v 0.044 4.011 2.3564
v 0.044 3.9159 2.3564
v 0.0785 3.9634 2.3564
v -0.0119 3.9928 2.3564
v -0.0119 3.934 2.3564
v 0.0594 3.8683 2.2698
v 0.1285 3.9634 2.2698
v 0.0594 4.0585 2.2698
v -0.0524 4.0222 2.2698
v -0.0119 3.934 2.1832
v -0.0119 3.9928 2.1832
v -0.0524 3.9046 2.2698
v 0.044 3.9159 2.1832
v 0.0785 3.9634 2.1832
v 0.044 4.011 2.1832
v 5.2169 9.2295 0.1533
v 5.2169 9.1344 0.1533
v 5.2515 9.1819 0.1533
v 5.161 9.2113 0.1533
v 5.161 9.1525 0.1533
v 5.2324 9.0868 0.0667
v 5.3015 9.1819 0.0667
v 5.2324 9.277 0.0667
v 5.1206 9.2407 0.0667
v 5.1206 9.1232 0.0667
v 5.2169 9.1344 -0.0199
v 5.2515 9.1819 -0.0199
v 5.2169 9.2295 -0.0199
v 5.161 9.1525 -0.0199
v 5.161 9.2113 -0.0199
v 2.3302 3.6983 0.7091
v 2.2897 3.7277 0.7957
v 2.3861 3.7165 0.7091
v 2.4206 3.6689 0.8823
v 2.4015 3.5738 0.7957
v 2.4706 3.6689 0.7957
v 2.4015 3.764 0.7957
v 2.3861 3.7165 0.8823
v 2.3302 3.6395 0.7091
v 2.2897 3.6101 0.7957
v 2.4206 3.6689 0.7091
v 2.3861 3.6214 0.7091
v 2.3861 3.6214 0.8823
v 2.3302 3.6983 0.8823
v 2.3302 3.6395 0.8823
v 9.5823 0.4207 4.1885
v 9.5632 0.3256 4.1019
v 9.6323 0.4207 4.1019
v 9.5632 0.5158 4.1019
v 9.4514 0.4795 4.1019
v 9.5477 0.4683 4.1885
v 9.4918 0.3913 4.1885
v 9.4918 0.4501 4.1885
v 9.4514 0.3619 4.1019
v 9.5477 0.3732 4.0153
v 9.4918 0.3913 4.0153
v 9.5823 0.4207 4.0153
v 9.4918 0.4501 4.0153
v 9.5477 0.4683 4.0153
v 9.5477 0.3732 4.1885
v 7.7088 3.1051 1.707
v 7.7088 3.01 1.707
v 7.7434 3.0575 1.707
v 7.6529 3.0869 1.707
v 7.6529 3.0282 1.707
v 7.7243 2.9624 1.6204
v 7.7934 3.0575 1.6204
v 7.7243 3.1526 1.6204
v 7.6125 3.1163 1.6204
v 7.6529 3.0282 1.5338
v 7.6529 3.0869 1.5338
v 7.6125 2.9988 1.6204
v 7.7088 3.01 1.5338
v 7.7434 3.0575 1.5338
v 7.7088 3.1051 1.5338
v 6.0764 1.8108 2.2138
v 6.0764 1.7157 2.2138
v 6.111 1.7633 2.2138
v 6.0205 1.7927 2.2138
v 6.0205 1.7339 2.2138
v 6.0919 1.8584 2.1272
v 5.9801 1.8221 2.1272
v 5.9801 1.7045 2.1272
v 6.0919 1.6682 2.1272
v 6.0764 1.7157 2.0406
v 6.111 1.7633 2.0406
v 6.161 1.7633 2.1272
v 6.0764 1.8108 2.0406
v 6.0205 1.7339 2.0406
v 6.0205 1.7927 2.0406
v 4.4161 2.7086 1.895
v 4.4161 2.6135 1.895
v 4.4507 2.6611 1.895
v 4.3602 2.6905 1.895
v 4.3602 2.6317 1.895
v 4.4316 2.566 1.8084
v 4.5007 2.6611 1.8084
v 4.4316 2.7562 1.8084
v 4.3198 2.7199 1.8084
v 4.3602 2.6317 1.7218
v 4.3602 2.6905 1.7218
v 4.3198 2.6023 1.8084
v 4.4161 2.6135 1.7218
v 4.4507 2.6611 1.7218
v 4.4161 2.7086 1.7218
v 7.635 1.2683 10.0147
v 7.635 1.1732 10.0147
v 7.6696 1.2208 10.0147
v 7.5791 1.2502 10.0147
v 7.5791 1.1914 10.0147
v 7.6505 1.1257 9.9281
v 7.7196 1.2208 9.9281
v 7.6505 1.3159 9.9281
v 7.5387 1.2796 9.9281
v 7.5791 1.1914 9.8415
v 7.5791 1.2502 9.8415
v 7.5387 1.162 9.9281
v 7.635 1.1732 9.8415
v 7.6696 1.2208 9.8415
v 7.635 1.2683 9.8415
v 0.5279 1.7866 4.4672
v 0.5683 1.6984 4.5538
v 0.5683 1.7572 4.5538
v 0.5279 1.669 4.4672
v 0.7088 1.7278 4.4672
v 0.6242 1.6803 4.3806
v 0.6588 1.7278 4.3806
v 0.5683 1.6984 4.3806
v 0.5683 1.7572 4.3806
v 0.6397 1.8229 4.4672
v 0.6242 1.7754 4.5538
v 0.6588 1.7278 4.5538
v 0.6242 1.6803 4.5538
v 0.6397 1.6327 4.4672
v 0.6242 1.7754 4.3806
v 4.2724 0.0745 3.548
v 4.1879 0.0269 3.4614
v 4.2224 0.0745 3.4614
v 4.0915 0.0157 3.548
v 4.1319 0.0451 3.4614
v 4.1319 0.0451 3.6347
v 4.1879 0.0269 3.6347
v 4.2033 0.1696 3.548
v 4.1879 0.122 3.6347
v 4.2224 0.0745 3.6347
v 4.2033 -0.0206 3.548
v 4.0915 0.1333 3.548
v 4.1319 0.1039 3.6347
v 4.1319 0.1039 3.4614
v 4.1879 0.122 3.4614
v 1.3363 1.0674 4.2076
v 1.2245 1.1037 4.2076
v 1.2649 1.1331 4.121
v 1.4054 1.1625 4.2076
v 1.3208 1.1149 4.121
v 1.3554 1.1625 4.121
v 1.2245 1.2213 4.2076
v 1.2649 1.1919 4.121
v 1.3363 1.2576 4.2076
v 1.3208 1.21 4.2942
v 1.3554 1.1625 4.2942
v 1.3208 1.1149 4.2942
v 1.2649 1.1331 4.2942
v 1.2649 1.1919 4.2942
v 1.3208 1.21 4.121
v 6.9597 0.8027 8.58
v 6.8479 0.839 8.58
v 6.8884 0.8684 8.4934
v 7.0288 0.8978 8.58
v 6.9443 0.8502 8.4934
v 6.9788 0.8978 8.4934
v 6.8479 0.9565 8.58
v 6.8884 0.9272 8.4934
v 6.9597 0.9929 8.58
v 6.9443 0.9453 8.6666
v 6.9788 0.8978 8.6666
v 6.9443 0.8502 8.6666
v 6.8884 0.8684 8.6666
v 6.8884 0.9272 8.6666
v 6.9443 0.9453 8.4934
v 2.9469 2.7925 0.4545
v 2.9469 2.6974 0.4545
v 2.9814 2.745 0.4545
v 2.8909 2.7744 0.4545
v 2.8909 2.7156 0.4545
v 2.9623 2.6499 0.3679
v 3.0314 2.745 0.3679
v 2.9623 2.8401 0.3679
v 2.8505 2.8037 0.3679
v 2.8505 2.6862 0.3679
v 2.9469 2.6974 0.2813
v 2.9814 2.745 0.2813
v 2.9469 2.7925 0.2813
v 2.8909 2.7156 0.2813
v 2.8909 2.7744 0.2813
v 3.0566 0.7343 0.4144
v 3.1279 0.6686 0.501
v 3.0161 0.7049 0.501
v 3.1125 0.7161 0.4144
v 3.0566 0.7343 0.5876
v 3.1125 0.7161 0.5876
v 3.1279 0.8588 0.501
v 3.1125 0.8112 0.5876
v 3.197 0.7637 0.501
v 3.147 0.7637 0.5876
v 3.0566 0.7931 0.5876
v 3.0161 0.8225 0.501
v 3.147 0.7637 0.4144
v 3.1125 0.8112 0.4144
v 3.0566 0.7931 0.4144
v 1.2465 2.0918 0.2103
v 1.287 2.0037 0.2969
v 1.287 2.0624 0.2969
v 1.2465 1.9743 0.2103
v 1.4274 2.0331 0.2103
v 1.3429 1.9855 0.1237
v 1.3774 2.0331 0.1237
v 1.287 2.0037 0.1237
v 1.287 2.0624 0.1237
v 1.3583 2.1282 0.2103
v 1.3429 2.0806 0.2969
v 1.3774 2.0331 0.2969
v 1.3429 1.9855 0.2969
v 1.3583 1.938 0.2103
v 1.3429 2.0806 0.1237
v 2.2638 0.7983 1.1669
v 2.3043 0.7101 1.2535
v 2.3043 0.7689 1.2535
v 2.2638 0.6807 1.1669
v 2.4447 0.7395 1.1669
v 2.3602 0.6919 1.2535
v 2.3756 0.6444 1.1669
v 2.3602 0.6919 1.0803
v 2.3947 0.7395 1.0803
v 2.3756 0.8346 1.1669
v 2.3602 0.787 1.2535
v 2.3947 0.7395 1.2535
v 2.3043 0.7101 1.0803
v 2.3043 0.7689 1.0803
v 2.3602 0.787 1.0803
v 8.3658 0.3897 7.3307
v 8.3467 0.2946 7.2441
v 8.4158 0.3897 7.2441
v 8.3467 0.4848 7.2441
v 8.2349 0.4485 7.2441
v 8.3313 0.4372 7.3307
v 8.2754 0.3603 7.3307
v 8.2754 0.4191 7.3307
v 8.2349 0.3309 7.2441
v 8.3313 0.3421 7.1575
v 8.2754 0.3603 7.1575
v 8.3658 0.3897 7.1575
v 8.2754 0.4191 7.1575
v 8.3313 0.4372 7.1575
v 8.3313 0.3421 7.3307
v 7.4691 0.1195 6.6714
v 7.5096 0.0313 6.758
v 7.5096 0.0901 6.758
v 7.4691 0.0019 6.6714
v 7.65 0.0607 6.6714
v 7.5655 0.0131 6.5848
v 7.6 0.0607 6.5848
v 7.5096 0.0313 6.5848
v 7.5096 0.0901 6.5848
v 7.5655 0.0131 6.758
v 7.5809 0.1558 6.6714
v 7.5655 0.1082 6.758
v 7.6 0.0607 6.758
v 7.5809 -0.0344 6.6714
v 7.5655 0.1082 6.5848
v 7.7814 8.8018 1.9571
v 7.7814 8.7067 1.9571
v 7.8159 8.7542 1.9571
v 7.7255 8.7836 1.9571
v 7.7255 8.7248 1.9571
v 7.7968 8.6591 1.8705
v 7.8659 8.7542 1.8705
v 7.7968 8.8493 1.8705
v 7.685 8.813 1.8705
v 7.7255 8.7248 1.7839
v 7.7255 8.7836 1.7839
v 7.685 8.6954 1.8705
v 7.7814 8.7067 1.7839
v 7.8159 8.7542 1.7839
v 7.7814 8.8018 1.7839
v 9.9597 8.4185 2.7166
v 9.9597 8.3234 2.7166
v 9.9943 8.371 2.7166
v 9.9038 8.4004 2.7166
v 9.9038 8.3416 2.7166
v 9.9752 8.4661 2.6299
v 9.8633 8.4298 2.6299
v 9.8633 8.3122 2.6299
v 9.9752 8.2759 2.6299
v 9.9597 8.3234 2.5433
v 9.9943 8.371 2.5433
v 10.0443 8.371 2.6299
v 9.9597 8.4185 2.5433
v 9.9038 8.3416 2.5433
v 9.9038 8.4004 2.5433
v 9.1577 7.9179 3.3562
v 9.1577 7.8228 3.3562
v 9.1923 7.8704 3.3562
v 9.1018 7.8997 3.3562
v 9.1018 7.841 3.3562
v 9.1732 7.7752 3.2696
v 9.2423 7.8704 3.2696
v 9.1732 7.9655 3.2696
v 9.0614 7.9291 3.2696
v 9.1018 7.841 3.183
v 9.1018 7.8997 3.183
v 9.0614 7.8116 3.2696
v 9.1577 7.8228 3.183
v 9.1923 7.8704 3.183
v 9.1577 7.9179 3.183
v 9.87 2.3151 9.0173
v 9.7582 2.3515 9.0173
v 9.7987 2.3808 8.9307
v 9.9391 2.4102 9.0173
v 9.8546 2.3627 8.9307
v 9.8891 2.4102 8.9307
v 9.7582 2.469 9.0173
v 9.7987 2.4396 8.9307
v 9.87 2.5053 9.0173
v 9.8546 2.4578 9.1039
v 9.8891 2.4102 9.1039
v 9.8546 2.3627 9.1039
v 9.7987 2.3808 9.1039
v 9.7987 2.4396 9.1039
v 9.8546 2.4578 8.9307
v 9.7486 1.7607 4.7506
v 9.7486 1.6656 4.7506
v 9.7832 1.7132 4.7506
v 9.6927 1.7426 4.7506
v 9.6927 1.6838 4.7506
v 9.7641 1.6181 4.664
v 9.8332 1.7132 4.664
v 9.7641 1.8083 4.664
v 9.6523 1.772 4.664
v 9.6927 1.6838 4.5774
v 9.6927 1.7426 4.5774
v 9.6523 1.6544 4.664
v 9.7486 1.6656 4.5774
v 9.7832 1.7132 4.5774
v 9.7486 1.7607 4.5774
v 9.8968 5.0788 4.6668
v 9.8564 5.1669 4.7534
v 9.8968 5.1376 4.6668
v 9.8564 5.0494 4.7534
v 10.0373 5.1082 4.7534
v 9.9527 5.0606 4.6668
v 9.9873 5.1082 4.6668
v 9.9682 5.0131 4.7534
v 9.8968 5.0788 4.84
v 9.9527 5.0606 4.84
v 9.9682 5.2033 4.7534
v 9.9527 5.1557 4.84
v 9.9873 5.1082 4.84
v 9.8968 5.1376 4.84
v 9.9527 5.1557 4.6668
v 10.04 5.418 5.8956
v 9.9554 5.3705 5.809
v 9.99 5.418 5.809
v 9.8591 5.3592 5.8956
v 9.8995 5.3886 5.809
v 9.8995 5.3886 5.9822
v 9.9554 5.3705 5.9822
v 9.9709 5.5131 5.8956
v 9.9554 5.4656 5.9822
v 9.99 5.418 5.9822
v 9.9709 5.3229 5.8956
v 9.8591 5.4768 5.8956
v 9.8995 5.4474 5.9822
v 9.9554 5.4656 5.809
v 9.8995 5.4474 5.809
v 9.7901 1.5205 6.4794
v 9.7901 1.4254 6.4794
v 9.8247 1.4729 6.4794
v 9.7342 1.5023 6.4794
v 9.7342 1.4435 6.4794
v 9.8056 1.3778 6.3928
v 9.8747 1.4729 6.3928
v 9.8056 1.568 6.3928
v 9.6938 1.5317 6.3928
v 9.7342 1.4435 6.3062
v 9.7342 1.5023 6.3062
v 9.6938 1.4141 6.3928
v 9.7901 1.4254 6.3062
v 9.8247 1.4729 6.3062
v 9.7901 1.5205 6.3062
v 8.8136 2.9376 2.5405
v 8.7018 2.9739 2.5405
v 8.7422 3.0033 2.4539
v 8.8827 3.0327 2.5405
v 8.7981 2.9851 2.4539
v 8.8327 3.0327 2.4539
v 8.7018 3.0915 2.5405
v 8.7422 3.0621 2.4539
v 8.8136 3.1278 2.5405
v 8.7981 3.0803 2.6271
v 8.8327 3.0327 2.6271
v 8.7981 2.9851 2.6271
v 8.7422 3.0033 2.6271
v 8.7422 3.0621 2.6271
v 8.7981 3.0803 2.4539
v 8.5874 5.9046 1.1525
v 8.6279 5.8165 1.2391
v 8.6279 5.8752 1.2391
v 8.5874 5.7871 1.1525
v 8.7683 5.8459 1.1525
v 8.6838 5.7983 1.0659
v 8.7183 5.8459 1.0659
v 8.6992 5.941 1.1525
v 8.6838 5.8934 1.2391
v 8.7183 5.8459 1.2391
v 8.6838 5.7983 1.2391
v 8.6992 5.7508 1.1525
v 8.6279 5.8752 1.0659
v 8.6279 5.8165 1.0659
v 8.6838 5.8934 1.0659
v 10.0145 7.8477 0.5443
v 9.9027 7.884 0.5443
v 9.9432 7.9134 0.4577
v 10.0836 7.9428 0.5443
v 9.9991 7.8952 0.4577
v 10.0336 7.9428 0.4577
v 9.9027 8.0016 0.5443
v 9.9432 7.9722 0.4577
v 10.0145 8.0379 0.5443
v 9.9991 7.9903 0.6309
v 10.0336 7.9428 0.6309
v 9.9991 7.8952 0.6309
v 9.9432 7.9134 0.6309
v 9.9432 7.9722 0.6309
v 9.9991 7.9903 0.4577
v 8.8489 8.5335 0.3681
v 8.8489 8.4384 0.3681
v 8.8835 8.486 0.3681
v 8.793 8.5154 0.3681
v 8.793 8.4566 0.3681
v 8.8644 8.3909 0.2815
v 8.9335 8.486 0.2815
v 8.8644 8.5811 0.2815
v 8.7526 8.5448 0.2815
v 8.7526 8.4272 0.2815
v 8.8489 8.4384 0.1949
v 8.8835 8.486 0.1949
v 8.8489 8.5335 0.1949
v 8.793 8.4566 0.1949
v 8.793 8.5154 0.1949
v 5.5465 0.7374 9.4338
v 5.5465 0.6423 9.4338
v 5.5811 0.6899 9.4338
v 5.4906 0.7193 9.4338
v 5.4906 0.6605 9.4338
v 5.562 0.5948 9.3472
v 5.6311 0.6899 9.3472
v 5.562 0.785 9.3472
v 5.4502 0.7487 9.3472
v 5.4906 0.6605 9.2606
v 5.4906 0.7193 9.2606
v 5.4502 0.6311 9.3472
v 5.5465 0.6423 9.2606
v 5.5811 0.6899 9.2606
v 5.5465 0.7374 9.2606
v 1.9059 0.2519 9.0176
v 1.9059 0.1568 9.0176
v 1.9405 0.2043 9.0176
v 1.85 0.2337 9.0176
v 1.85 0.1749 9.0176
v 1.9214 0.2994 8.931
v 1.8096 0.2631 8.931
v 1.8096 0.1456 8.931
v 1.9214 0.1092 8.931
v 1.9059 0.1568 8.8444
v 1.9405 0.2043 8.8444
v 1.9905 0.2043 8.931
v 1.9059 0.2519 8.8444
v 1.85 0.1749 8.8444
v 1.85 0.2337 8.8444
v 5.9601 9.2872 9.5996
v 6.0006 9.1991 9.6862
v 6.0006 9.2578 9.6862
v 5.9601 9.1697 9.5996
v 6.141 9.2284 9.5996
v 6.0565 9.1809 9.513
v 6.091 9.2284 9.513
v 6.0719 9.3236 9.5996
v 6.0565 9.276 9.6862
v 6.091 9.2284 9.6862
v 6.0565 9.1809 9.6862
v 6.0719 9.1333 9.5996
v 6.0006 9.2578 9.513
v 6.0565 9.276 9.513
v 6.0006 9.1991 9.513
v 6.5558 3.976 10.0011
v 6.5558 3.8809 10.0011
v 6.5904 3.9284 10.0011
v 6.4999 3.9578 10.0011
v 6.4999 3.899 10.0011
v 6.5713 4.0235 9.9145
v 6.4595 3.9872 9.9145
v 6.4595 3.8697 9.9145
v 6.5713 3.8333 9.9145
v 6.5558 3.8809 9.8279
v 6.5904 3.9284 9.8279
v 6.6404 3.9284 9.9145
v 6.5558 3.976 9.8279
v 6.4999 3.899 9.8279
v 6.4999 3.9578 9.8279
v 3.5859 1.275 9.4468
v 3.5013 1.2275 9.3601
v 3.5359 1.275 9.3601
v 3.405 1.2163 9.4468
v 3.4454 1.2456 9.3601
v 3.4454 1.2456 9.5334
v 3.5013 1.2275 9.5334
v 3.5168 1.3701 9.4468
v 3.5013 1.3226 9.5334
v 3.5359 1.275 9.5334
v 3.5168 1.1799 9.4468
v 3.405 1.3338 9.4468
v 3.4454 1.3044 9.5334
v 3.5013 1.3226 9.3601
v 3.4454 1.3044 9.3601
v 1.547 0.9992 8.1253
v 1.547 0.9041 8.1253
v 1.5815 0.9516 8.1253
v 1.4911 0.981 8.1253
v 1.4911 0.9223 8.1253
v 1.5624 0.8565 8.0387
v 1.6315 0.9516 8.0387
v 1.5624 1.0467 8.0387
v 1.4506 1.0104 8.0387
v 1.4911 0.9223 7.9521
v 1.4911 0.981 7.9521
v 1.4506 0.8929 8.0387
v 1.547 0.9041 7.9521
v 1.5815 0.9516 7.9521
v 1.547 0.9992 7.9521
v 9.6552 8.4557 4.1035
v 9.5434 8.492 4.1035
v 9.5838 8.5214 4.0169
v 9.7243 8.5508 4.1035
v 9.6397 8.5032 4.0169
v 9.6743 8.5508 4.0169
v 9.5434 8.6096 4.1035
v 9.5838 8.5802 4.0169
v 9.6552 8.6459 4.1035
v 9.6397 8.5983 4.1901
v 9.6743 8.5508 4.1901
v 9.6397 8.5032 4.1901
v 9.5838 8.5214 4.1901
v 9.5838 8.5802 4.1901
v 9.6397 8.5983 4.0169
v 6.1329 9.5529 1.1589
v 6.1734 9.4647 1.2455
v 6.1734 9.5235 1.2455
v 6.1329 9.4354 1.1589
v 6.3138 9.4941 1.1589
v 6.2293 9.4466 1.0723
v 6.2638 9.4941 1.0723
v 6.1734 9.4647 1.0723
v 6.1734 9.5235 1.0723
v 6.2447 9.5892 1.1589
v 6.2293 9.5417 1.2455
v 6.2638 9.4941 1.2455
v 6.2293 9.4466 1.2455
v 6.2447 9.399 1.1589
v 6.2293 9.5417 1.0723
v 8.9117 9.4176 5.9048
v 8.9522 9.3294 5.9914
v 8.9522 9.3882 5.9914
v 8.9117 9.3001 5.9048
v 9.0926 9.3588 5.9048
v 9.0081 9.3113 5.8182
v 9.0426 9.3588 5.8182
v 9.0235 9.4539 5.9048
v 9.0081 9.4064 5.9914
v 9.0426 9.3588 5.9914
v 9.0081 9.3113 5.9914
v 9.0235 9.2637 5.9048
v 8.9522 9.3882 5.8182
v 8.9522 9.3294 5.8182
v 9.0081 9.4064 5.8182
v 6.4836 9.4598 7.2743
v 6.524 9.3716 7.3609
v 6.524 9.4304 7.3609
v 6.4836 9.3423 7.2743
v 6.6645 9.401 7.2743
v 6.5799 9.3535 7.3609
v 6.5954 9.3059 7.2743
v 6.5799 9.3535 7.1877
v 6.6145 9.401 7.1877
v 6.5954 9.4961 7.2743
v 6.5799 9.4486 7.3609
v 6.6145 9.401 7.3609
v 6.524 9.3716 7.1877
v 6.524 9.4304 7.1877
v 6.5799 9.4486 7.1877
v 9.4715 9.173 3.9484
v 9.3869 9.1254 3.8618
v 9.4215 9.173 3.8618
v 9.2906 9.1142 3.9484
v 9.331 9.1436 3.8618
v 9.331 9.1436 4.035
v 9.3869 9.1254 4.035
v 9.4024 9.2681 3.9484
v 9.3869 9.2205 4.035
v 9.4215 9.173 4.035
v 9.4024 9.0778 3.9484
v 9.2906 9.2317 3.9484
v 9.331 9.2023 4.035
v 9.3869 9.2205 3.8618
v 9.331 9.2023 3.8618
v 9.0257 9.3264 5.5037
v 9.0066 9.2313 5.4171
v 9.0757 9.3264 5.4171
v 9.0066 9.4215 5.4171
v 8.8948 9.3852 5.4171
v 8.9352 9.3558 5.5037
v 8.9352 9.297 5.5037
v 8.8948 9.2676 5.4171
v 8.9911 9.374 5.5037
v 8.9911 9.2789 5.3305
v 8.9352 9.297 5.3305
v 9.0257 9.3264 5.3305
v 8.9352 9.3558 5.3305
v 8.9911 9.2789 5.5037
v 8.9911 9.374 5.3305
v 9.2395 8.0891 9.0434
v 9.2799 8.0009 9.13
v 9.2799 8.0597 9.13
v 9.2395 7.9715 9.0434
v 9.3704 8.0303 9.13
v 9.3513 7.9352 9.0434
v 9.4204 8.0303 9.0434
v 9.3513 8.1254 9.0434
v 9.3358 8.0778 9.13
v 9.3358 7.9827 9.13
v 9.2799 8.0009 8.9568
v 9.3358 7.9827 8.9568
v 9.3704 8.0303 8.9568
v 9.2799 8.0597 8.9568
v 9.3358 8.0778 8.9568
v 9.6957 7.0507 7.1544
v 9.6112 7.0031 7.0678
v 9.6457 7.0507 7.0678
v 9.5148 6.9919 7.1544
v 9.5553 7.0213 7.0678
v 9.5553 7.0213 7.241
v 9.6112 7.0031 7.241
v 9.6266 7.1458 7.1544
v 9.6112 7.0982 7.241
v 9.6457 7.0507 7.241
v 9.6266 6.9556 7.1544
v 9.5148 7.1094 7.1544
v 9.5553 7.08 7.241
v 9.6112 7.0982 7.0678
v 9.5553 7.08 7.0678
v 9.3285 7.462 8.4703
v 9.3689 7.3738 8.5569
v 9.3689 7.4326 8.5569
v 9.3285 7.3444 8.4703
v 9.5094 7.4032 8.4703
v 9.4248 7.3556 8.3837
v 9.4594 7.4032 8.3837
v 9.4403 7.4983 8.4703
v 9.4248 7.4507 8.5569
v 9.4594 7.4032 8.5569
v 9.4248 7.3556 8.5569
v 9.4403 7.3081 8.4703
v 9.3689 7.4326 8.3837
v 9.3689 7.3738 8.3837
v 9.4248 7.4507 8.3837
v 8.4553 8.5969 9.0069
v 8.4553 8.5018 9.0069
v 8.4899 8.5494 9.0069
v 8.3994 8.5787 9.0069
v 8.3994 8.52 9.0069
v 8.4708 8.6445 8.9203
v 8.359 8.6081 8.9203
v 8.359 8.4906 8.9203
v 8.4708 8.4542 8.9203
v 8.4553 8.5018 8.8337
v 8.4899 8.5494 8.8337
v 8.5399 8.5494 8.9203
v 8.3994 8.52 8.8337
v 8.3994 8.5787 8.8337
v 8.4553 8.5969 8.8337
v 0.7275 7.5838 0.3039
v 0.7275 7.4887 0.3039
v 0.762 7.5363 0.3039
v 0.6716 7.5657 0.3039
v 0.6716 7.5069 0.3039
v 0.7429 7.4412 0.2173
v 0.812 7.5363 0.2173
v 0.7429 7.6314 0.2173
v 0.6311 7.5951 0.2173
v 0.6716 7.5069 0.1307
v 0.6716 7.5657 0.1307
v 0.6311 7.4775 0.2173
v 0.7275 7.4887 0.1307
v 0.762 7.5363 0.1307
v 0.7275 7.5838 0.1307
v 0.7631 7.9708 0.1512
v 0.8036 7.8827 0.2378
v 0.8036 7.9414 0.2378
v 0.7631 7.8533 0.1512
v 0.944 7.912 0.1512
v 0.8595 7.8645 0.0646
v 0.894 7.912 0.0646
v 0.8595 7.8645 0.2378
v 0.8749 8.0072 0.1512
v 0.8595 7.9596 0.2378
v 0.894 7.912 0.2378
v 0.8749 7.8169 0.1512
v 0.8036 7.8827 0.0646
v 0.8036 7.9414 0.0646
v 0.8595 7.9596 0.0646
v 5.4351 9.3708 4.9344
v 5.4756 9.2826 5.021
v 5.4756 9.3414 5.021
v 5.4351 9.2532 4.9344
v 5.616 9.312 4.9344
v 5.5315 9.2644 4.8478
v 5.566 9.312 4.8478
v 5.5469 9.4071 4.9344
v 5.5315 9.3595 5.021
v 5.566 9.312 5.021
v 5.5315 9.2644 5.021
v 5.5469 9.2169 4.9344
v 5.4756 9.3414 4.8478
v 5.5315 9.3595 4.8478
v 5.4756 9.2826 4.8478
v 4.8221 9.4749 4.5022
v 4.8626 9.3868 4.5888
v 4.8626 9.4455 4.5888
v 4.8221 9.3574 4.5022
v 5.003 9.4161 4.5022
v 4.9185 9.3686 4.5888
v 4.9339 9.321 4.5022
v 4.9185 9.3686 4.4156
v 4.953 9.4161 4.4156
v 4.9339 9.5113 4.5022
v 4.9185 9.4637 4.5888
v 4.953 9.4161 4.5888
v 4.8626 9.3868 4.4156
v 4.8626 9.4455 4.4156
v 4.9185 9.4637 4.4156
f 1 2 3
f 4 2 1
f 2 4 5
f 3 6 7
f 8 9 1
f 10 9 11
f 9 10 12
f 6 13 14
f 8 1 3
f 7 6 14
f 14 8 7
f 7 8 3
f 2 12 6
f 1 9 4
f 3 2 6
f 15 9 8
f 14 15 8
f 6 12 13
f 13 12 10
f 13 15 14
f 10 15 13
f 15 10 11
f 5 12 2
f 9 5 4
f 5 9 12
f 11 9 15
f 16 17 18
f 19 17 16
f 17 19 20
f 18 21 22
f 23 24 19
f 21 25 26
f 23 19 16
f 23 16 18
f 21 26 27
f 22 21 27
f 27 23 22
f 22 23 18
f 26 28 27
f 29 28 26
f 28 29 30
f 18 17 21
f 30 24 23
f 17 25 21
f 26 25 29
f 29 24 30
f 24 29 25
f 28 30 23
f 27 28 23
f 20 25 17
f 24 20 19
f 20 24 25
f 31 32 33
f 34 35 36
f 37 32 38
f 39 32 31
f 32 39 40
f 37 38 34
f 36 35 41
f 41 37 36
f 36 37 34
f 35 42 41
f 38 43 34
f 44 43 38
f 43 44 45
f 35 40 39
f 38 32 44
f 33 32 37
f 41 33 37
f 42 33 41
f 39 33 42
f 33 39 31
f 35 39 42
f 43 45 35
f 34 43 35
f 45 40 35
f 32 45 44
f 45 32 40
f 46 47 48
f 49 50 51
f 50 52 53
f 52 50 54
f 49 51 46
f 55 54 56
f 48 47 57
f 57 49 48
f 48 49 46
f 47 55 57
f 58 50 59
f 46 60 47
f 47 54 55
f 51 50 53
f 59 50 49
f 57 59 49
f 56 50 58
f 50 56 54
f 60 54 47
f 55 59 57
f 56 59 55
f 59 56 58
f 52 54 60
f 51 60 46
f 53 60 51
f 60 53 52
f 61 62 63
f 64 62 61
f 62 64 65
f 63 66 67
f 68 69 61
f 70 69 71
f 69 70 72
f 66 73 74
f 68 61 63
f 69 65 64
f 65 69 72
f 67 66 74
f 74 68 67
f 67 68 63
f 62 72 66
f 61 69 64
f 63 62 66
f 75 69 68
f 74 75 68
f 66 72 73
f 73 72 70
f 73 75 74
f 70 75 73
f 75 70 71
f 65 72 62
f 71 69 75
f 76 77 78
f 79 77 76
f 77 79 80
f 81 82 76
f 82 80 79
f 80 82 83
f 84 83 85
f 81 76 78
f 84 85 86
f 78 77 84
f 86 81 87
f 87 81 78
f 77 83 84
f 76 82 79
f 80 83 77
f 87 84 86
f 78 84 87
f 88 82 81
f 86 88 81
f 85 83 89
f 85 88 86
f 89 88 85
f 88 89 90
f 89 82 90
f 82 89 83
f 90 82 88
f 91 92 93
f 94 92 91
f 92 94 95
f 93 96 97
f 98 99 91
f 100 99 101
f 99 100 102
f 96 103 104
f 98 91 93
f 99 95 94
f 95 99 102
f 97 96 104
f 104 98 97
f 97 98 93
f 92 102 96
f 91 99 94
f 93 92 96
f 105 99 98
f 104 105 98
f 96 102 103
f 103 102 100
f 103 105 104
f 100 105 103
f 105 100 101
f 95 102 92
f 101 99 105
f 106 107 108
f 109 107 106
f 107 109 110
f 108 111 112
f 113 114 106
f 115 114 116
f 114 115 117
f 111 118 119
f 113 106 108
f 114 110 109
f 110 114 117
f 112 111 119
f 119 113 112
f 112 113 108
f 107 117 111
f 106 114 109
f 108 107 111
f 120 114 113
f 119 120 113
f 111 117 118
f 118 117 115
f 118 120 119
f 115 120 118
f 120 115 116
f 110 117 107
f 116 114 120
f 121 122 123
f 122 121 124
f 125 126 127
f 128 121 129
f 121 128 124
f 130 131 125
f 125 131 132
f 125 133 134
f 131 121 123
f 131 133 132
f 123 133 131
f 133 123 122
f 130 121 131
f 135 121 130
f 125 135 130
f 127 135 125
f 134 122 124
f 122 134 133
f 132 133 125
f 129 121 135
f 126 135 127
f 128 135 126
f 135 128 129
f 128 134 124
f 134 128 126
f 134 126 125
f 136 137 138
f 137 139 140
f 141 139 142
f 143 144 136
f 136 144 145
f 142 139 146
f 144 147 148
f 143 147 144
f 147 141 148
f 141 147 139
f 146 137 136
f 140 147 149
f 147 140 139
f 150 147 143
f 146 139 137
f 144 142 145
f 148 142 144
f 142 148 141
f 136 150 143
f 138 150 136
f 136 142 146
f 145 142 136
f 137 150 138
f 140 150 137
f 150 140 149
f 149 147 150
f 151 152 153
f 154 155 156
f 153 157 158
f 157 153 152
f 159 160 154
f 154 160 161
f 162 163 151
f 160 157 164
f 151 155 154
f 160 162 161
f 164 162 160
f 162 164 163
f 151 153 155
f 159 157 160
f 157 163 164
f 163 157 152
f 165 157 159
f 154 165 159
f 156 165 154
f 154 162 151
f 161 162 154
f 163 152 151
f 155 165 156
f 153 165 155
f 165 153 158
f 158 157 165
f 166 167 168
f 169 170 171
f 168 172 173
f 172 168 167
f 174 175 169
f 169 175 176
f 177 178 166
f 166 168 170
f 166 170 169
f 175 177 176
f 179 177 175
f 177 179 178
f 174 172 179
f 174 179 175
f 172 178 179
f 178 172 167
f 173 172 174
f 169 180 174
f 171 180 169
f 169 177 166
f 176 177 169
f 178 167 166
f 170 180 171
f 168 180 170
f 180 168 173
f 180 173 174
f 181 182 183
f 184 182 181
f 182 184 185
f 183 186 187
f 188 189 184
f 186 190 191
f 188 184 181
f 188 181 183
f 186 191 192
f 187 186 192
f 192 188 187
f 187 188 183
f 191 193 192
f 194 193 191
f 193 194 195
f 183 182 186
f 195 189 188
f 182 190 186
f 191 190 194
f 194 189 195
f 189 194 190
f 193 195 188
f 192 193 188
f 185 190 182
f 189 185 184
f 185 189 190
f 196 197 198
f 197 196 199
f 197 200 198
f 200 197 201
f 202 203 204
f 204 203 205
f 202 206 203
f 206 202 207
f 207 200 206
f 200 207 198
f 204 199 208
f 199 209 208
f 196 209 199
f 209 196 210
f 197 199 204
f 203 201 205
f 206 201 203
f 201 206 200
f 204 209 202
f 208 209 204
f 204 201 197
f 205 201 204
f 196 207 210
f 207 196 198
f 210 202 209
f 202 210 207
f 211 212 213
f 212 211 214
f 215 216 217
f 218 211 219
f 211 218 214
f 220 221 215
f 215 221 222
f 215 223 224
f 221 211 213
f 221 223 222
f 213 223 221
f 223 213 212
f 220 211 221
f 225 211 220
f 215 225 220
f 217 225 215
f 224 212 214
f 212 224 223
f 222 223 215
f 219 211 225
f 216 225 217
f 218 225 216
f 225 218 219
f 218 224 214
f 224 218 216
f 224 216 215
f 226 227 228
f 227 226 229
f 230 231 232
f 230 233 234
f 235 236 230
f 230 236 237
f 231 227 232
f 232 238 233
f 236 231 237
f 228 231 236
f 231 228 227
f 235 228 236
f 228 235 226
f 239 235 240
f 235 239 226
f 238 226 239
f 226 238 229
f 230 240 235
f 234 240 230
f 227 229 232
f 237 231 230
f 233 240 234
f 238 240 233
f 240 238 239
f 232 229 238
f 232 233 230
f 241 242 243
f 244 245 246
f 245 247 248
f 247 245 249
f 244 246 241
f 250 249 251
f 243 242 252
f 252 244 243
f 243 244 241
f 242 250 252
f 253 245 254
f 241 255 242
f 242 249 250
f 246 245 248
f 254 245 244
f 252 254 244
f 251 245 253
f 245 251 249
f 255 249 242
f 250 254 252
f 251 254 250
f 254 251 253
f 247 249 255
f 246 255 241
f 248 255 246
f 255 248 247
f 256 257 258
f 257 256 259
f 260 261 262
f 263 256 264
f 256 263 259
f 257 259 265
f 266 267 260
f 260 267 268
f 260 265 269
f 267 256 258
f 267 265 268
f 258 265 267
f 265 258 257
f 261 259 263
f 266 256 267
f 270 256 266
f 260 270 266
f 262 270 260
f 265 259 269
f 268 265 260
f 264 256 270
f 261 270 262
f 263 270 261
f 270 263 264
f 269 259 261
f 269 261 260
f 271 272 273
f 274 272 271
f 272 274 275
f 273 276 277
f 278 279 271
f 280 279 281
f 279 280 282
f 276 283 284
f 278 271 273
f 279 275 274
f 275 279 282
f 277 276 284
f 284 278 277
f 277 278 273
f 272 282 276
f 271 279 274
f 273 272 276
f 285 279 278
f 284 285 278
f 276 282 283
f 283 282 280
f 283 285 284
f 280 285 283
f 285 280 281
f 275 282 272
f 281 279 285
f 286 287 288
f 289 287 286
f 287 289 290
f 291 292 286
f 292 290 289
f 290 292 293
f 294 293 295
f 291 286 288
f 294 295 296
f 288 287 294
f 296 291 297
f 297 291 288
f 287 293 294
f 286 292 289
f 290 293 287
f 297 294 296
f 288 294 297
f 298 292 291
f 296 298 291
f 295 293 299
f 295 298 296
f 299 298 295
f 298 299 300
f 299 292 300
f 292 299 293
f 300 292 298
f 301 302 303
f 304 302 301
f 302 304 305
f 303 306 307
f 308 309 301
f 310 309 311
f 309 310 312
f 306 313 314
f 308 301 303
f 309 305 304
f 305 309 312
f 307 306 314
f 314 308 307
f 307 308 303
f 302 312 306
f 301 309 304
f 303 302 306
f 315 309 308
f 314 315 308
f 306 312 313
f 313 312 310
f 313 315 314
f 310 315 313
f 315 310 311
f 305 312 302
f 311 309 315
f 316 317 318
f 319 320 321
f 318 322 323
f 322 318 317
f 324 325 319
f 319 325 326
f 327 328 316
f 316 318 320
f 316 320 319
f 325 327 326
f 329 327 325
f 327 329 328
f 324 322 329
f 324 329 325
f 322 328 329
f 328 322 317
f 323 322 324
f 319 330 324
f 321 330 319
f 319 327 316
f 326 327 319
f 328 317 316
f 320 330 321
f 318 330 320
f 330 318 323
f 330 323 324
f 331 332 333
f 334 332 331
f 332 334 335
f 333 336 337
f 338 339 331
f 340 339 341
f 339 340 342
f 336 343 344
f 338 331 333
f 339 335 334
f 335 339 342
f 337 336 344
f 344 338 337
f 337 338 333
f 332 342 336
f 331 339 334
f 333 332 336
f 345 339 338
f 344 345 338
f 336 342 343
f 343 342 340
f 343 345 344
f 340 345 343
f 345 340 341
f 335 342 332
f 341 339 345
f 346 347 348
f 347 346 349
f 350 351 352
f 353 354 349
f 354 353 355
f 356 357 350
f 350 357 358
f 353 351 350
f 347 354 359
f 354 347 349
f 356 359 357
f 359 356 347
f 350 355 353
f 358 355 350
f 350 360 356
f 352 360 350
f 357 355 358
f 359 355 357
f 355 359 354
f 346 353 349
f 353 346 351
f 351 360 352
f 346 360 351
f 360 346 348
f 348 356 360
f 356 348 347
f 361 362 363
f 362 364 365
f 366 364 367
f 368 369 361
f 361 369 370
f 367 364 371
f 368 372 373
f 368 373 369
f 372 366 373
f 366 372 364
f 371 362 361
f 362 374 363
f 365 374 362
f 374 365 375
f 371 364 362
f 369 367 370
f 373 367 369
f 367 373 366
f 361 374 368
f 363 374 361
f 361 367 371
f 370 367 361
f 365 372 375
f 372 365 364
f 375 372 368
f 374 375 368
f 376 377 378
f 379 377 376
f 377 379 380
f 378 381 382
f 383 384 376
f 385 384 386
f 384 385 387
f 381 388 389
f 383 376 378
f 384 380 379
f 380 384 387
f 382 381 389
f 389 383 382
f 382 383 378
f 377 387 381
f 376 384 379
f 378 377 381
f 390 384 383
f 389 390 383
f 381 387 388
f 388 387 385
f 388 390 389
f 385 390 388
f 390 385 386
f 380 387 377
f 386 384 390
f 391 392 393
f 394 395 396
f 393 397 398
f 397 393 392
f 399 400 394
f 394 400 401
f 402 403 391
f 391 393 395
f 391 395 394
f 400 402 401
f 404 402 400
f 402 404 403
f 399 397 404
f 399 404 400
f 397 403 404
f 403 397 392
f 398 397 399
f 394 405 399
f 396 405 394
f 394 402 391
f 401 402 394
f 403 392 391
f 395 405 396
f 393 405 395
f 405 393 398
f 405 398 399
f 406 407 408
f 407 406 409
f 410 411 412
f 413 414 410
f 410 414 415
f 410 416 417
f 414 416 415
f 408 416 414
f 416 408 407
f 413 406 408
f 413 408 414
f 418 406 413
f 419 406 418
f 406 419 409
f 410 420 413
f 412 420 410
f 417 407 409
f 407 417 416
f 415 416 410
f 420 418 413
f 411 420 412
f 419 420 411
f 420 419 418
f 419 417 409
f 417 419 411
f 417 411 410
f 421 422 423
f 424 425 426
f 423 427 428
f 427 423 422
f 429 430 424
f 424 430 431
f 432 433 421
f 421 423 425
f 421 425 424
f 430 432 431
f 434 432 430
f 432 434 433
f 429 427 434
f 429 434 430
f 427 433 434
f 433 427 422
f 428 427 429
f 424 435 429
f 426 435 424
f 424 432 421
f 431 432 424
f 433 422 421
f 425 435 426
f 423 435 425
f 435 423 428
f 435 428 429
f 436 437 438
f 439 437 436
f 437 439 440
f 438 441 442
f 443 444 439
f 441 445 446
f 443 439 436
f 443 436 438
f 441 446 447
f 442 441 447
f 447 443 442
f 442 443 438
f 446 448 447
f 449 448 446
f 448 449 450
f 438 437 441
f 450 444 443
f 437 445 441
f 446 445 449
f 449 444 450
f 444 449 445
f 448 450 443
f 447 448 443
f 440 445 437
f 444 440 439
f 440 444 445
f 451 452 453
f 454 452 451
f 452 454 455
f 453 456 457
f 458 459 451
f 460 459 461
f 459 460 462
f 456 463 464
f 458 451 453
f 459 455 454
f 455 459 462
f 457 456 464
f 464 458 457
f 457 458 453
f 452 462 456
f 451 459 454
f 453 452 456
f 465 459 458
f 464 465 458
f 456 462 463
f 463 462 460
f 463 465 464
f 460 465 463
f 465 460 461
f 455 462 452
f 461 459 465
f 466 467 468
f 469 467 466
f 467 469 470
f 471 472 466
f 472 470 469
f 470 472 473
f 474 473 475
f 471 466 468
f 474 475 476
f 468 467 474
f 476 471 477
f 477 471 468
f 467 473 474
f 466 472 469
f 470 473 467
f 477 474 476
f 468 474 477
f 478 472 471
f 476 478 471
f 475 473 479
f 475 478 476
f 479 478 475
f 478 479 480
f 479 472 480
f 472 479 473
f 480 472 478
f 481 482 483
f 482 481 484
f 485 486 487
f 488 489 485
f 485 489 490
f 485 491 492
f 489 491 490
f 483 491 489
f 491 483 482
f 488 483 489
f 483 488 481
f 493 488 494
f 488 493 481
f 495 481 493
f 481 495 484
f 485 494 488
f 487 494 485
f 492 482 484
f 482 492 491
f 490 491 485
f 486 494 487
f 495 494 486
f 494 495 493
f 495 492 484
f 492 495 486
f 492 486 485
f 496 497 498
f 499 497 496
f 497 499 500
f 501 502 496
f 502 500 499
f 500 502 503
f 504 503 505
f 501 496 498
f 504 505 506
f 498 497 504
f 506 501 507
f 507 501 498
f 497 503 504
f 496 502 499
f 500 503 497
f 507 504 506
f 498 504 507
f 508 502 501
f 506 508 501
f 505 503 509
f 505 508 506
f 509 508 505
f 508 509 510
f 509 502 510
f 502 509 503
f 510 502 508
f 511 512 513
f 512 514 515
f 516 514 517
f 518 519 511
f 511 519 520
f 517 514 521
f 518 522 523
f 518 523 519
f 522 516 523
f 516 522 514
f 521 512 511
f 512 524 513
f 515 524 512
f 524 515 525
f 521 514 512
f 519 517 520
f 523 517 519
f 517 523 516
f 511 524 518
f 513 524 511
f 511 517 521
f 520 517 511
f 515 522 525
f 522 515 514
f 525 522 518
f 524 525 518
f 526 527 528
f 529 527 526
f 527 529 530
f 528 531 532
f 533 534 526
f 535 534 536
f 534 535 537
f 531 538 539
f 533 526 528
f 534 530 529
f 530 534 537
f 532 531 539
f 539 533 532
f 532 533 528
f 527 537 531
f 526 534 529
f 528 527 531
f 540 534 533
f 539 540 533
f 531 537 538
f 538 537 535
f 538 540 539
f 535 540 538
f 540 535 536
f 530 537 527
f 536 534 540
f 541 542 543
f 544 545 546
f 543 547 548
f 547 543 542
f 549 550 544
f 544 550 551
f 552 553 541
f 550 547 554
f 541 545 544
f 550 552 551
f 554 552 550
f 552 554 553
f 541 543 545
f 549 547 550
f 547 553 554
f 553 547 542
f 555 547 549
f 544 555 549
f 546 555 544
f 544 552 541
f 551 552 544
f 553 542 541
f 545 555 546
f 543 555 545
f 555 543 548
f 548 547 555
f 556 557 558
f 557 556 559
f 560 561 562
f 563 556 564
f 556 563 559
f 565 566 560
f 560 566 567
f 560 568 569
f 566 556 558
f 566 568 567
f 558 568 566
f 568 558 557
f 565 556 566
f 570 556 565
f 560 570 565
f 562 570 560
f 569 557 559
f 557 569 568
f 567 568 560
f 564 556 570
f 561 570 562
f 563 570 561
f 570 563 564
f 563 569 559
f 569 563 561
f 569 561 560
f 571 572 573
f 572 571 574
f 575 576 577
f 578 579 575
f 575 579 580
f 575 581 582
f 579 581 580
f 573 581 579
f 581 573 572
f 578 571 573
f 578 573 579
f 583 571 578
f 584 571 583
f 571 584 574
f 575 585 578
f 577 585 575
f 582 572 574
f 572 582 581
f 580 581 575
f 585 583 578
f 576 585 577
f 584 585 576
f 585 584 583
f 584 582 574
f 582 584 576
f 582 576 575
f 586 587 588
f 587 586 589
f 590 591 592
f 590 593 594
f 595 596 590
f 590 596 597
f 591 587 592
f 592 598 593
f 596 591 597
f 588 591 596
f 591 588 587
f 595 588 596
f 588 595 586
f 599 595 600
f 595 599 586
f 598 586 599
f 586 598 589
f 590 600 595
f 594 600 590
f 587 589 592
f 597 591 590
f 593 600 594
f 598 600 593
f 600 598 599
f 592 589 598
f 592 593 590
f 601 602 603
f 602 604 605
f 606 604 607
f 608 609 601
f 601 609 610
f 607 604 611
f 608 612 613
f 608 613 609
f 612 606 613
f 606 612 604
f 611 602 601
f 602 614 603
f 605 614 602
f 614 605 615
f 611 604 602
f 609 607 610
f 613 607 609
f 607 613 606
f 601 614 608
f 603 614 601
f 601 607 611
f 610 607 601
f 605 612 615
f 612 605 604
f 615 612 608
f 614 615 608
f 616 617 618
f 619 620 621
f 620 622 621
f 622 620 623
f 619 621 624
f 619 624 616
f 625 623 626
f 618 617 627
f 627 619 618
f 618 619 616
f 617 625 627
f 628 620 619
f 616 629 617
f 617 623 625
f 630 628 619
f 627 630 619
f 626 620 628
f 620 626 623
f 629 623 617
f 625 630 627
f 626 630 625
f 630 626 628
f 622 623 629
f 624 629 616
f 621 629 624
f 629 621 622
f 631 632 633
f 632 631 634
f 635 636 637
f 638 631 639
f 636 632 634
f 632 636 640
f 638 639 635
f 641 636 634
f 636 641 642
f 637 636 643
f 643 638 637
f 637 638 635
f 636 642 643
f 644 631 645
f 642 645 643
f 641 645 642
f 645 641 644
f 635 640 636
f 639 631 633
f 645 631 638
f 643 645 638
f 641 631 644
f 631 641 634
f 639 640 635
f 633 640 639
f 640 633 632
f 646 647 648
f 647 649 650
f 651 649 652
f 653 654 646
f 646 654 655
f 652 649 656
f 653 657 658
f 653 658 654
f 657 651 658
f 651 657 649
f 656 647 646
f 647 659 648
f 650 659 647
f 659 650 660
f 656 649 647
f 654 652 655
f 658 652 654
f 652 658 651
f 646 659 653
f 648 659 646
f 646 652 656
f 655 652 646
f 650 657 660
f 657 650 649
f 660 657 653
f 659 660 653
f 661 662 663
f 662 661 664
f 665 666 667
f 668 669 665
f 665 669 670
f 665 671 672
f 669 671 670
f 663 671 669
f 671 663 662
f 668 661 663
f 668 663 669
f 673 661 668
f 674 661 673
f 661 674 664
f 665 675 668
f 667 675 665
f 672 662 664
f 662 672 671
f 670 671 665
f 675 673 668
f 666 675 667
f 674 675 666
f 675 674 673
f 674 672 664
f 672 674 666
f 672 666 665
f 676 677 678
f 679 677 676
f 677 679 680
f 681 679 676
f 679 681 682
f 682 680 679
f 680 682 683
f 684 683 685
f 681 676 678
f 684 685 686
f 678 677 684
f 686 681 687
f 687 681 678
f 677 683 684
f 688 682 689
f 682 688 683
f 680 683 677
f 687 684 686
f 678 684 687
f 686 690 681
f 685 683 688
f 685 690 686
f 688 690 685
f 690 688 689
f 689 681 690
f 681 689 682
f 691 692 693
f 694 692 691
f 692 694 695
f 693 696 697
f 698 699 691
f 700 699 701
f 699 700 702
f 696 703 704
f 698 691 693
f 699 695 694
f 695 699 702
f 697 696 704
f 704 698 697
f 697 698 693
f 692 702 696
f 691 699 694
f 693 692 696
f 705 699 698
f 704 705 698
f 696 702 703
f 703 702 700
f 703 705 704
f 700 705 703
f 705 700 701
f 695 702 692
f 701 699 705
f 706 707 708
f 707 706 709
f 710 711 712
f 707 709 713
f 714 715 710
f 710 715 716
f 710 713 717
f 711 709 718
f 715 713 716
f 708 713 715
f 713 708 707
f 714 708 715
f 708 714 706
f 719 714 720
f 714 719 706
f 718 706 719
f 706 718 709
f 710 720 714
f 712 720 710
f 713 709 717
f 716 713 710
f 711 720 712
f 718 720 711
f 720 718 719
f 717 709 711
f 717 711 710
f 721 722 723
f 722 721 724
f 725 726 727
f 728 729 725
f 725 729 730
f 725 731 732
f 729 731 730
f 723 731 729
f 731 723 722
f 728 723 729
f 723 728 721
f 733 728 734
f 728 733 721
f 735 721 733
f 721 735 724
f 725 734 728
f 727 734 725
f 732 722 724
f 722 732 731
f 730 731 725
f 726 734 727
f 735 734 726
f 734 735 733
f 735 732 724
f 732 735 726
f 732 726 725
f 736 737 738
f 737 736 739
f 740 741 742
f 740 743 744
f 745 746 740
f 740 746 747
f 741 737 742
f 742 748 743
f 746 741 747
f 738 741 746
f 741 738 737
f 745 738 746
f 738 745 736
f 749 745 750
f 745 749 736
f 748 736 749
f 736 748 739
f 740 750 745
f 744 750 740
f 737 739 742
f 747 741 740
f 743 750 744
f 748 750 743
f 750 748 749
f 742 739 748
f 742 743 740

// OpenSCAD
 points=([for(i=[0:120])[rnd(10),rnd(10),rnd(10)]]);
 

 a=quickhull(points);
 
color("Green") for (i=getpoints(a))translate(i)sphere(0.1);

 


for (i=[0:max(0,len(a)-1)]){
//echo(a[i]);
polyhedron(a[i],[[0,1,2]]);
} 
 function getpoints(v)=unique([for(i=v,j=i)j]);

function  uniquejoin(m,n) =  
    concat(m,[   for (i = n)    if (search([i],m,1)==[[]]) i  ]);

//function  unique(m) = [   for (i = [0: len(m) - 1])    if (search([m[i]],m,1)==[i]) m[i] ];

function  unique(m,first,last) = last==undef?unique(m,0,len(m)-1) :
last-first>1? let(mid=(first+last)/2)
uniquejoin(  unique(m,first,floor(mid)),         unique(m,ceil(mid),last) )
 :m[first]==undef? [m[last]]: m[last]==undef?[m[first]] :concat([m[first]],[if( m[last]!=m[first])m[last]] ) ;

 

function quickhull (v)=
len(v)<1? []:
 
 
let(
extremes = [[IofminX(v), IofmaxX(v)], [IofminY(v), IofmaxY(v)], [IofminZ(v), IofmaxZ(v)] ], 
// find extremes this works
extreme_distances = [
norm(v[extremes.x[0]] - v[extremes.x[1]])
, norm(v[extremes.y[0]] - v[extremes.y[1]])
, norm(v[extremes.z[0]] - v[extremes.z[1]])
], 
// find extreme axis this works

baseline = index_max(extreme_distances), 

p0i = extremes[baseline][0],
p1i = extremes[baseline][1], 

// this works

extremes2 = [
IofminX(v), IofmaxX(v), IofminY(v),
IofmaxY(v), IofminZ(v), IofmaxZ(v)],


extreme_distances2 = [
    for (i = [0: 5]) point_to_line(v[extremes2[i]], v[p0i],
      v[p1i])
],
p2i = extremes2[index_max(extreme_distances2)], 
nbase = face_normal(    v[p0i], v[p1i], v[p2i]), 

distances_from_plane = [
    for (i = [0:  len(v) - 1]) (distance_point2plane(
      v[i], v[p0i], nbase))], 

p3i = index_max(distances_from_plane)
,
p0=points[p0i],
p1=points[p1i],
p2=points[p2i],
p3=points[p3i],
n210=face_normal(p2,p1,p0),
n013=face_normal(p0,p1,p3),
n123=face_normal(p1,p2,p3),
n203=face_normal(p2,p0,p3),
    
    v0=[for (i=[0:max(0,len(v)-1)]) 
        if(
            distance_point2plane(v[i], p3, n013)>0
        ||    distance_point2plane(v[i], p3, n123)>0
          ||  distance_point2plane(v[i], p3, n203)>0
            
        
        )v[i]],

v210=[for (i=[0:max(0,len(v0)-1)]) 
        if(distance_point2plane(v0[i], p0, n210)>0)v0[i]],
    v210r=[for (i=[0:max(0,len(v0)-1)]) 
            if(distance_point2plane(v0[i], p0, n210)<=0)v0[i]],
                
v013=[for (i=[0:max(0,len(v210r)-1)]) 
        if(distance_point2plane(v210r[i], p0, n013)>0)v210r[i]],
    v013r=[for (i=[0:max(0,len(v210r)-1)]) 
            if(distance_point2plane(v210r[i], p0, n013)<=0)v210r[i]],
                
v123=[for (i=[0:max(0,len(v013r)-1)]) 
        if(distance_point2plane(v013r[i], p3, n123)>0)v013r[i]],
    v123r=[for (i=[0:max(0,len(v013r)-1)]) 
            if(distance_point2plane(v013r[i], p3, n123)<=0)v013r[i]],
                
v203=[for (i=[0:max(0,len(v123r)-1)]) 
        if(distance_point2plane(v123r[i], p3, n203)>0)v123r[i]],


res=concat(
quickhull_prime (v203,p2,p0,p3),
quickhull_prime (v123,p1,p2,p3),
quickhull_prime (v013,p0,p1,p3),
quickhull_prime (v210,p2,p1,p0)
)     
        ) res
;

function quickhull_prime (v,p0,p1,p2,c=115)=
c>0&& len(v)>0  ?
let(
n=face_normal(p0,p1,p2),
 
p3d= [for (i=[0:max(0,len(v)-1)])  distance_point2plane(v[i], p0, n)] ,
p3max = max(p3d),
p3i= search(p3max, p3d)[0],
p3=v[p3i],
n013=face_normal(p0,p1,p3),
n123=face_normal(p1,p2,p3),
n203=face_normal(p2,p0,p3),


v0=[for (i=[0:max(0,len(v)-1)]) 
        if(
           distance_point2plane(v[i], p3, n013)>0
        ||    distance_point2plane(v[i], p3, n123)>0
          ||  distance_point2plane(v[i], p3, n203)>0
            
        
        )v[i]],

v1=[for (i=[0:max(0,len(v0)-1)]) 
        if(distance_point2plane(v0[i], p3, n013)>0)v0[i]],
            
v1r=[for (i=[0:max(0,len(v0)-1)]) 
            if(distance_point2plane(v0[i], p3, n013)<=0)v0[i]],
                
v2=[for (i=[0:max(0,len(v1r)-1)]) 
        if(distance_point2plane(v1r[i], p3, n123)>0)v1r[i]],
            
 v2r=[for (i=[0:max(0,len(v1r)-1)]) 
            if(distance_point2plane(v1r[i], p3, n123)<=0)v1r[i]],
                
v3=[for (i=[0:max(0,len(v2r)-1)]) 
        if(distance_point2plane(v2r[i], p3, n203)>0)v2r[i]]

 ) 

concat(

quickhull_prime (v1,p0,p1,p3,c-1),
quickhull_prime (v2,p1,p2,p3,c-1),
quickhull_prime (v3,p2,p0,p3,c-1))
:
[[p0,p1,p2]]
 
;


function index_min(l) = search(min(l), l)[0];
function index_max(l) = search(max(l), l)[0];
 
 
 function distance_point2plane(p,o,n) =   dot (p-o,n); 


function face_normal(point_a,point_b,point_c)=
let(u=point_a-point_b,v=point_a-point_c)
un(cross (u,v));

function un(v)=v/max(len3(v),1e-64);
function len3(v) =len(v)>1?
sqrt(addl([for(i=[0:len(v)-1])pow(v[i], 2)]))
:len(v)==1?v[0]:v; 
function addl(l,c=0)= len(l)-1 >c?l[c]+addl(l,c+1):l[c];
function rnd(a = 1, b = 0, s = []) = 
  s == [] ? 
   (rands(min(a, b), max(   a, b), 1)[0]) 
  : 
   (rands(min(a, b), max(a, b), 1, s)[0])
  ; 

function IofminX(p)=let(m=min([for(i=p)i.x]))search(m,p,0, 0)[0];
function IofmaxX(p)=let(m=max([for(i=p)i.x]))search(m,p,0, 0)[0];
function IofminY(p)=let(m=min([for(i=p)i.y]))search(m,p,0, 1)[0];
function IofmaxY(p)=let(m=max([for(i=p)i.y]))search(m,p,0, 1)[0];
function IofminZ(p)=let(m=min([for(i=p)i.z]))search(m,p,0, 2)[0];
function IofmaxZ(p)=let(m=max([for(i=p)i.z]))search(m,p,0, 2)[0];
function minX(p)=min([for(i=p)i.x]);
function maxX(p)=max([for(i=p)i.x]);
function minY(p)=min([for(i=p)i.y]);
function maxY(p)=max([for(i=p)i.y]);
function minZ(p)=min([for(i=p)i.z]);
function maxZ(p)=max([for(i=p)i.z]);
function dot(v1,v2) = v1[0]* v2[0]+ v1[1]* v2[1]+ v1[2]* v2[2];


function point_to_line(p,a,b)=
let(
pa = p - a, 
ba = b - a,
h = clamp( (pa*ba)/ (ba*ba)))
norm( pa - ba*h ) ;

function clamp(a, b = 0, c = 1) = min(max(a, b), c);







function dist_point2plane(p,o,n) =   dot (p-o,n); 
function is_vertex(v)= is_list(v) && len(v)==3 &&(is_num(v[0])&&is_num(v[1])&&is_num(v[2])) ;
function v3(p) = [p.x,p.y,p.z]; // vec3 formatter
function rev(v) = [for (i = [len(v) - 1: -1: 0]) v[i]];
function avrg(l) = len(l) > 1 ? addl(l) / (len(l)) : l;
function avrgp(l) = len(l) > 1 ? addlp(l) / (len(l)) : l;
function addlp(v,i=0,r=[0,0,0]) = i<len(v) ? addlp(v,i+1,r+v[i]) : r;
function lerp(start,end,bias) = (end * bias + start * (1 - bias));
function un(v)=assert (is_list(v)) v/max(norm(v),1e-64) ;
function rndc(a = 1,b = 0,s = [])=[rnd(a,b,s),rnd(a,b,s),rnd(a,b,s)];
function rnd(a = 1,b = 0,s = []) =
s == []?(rands(min(a,b),max(a,b),1)[0]) :(rands(min(a,b),max(a,b),1,s)[0]);
module polyline(p) {for(i=[0:max(0,len(p)-2)])line(p[i],p[wrap(i+1,len(p) )]);}
module polyline_open(p) {
     if (len(p)-1>1)
     for(i=[0:max(0,len(p)-2)])line(p[i],p[   i+1]);
} // polyline plotter
module line(p1,p2 ,width=2) 
{ // single line plotter
hull() {
translate(p1) sphere(width);
translate(p2) sphere(width);
}
}
